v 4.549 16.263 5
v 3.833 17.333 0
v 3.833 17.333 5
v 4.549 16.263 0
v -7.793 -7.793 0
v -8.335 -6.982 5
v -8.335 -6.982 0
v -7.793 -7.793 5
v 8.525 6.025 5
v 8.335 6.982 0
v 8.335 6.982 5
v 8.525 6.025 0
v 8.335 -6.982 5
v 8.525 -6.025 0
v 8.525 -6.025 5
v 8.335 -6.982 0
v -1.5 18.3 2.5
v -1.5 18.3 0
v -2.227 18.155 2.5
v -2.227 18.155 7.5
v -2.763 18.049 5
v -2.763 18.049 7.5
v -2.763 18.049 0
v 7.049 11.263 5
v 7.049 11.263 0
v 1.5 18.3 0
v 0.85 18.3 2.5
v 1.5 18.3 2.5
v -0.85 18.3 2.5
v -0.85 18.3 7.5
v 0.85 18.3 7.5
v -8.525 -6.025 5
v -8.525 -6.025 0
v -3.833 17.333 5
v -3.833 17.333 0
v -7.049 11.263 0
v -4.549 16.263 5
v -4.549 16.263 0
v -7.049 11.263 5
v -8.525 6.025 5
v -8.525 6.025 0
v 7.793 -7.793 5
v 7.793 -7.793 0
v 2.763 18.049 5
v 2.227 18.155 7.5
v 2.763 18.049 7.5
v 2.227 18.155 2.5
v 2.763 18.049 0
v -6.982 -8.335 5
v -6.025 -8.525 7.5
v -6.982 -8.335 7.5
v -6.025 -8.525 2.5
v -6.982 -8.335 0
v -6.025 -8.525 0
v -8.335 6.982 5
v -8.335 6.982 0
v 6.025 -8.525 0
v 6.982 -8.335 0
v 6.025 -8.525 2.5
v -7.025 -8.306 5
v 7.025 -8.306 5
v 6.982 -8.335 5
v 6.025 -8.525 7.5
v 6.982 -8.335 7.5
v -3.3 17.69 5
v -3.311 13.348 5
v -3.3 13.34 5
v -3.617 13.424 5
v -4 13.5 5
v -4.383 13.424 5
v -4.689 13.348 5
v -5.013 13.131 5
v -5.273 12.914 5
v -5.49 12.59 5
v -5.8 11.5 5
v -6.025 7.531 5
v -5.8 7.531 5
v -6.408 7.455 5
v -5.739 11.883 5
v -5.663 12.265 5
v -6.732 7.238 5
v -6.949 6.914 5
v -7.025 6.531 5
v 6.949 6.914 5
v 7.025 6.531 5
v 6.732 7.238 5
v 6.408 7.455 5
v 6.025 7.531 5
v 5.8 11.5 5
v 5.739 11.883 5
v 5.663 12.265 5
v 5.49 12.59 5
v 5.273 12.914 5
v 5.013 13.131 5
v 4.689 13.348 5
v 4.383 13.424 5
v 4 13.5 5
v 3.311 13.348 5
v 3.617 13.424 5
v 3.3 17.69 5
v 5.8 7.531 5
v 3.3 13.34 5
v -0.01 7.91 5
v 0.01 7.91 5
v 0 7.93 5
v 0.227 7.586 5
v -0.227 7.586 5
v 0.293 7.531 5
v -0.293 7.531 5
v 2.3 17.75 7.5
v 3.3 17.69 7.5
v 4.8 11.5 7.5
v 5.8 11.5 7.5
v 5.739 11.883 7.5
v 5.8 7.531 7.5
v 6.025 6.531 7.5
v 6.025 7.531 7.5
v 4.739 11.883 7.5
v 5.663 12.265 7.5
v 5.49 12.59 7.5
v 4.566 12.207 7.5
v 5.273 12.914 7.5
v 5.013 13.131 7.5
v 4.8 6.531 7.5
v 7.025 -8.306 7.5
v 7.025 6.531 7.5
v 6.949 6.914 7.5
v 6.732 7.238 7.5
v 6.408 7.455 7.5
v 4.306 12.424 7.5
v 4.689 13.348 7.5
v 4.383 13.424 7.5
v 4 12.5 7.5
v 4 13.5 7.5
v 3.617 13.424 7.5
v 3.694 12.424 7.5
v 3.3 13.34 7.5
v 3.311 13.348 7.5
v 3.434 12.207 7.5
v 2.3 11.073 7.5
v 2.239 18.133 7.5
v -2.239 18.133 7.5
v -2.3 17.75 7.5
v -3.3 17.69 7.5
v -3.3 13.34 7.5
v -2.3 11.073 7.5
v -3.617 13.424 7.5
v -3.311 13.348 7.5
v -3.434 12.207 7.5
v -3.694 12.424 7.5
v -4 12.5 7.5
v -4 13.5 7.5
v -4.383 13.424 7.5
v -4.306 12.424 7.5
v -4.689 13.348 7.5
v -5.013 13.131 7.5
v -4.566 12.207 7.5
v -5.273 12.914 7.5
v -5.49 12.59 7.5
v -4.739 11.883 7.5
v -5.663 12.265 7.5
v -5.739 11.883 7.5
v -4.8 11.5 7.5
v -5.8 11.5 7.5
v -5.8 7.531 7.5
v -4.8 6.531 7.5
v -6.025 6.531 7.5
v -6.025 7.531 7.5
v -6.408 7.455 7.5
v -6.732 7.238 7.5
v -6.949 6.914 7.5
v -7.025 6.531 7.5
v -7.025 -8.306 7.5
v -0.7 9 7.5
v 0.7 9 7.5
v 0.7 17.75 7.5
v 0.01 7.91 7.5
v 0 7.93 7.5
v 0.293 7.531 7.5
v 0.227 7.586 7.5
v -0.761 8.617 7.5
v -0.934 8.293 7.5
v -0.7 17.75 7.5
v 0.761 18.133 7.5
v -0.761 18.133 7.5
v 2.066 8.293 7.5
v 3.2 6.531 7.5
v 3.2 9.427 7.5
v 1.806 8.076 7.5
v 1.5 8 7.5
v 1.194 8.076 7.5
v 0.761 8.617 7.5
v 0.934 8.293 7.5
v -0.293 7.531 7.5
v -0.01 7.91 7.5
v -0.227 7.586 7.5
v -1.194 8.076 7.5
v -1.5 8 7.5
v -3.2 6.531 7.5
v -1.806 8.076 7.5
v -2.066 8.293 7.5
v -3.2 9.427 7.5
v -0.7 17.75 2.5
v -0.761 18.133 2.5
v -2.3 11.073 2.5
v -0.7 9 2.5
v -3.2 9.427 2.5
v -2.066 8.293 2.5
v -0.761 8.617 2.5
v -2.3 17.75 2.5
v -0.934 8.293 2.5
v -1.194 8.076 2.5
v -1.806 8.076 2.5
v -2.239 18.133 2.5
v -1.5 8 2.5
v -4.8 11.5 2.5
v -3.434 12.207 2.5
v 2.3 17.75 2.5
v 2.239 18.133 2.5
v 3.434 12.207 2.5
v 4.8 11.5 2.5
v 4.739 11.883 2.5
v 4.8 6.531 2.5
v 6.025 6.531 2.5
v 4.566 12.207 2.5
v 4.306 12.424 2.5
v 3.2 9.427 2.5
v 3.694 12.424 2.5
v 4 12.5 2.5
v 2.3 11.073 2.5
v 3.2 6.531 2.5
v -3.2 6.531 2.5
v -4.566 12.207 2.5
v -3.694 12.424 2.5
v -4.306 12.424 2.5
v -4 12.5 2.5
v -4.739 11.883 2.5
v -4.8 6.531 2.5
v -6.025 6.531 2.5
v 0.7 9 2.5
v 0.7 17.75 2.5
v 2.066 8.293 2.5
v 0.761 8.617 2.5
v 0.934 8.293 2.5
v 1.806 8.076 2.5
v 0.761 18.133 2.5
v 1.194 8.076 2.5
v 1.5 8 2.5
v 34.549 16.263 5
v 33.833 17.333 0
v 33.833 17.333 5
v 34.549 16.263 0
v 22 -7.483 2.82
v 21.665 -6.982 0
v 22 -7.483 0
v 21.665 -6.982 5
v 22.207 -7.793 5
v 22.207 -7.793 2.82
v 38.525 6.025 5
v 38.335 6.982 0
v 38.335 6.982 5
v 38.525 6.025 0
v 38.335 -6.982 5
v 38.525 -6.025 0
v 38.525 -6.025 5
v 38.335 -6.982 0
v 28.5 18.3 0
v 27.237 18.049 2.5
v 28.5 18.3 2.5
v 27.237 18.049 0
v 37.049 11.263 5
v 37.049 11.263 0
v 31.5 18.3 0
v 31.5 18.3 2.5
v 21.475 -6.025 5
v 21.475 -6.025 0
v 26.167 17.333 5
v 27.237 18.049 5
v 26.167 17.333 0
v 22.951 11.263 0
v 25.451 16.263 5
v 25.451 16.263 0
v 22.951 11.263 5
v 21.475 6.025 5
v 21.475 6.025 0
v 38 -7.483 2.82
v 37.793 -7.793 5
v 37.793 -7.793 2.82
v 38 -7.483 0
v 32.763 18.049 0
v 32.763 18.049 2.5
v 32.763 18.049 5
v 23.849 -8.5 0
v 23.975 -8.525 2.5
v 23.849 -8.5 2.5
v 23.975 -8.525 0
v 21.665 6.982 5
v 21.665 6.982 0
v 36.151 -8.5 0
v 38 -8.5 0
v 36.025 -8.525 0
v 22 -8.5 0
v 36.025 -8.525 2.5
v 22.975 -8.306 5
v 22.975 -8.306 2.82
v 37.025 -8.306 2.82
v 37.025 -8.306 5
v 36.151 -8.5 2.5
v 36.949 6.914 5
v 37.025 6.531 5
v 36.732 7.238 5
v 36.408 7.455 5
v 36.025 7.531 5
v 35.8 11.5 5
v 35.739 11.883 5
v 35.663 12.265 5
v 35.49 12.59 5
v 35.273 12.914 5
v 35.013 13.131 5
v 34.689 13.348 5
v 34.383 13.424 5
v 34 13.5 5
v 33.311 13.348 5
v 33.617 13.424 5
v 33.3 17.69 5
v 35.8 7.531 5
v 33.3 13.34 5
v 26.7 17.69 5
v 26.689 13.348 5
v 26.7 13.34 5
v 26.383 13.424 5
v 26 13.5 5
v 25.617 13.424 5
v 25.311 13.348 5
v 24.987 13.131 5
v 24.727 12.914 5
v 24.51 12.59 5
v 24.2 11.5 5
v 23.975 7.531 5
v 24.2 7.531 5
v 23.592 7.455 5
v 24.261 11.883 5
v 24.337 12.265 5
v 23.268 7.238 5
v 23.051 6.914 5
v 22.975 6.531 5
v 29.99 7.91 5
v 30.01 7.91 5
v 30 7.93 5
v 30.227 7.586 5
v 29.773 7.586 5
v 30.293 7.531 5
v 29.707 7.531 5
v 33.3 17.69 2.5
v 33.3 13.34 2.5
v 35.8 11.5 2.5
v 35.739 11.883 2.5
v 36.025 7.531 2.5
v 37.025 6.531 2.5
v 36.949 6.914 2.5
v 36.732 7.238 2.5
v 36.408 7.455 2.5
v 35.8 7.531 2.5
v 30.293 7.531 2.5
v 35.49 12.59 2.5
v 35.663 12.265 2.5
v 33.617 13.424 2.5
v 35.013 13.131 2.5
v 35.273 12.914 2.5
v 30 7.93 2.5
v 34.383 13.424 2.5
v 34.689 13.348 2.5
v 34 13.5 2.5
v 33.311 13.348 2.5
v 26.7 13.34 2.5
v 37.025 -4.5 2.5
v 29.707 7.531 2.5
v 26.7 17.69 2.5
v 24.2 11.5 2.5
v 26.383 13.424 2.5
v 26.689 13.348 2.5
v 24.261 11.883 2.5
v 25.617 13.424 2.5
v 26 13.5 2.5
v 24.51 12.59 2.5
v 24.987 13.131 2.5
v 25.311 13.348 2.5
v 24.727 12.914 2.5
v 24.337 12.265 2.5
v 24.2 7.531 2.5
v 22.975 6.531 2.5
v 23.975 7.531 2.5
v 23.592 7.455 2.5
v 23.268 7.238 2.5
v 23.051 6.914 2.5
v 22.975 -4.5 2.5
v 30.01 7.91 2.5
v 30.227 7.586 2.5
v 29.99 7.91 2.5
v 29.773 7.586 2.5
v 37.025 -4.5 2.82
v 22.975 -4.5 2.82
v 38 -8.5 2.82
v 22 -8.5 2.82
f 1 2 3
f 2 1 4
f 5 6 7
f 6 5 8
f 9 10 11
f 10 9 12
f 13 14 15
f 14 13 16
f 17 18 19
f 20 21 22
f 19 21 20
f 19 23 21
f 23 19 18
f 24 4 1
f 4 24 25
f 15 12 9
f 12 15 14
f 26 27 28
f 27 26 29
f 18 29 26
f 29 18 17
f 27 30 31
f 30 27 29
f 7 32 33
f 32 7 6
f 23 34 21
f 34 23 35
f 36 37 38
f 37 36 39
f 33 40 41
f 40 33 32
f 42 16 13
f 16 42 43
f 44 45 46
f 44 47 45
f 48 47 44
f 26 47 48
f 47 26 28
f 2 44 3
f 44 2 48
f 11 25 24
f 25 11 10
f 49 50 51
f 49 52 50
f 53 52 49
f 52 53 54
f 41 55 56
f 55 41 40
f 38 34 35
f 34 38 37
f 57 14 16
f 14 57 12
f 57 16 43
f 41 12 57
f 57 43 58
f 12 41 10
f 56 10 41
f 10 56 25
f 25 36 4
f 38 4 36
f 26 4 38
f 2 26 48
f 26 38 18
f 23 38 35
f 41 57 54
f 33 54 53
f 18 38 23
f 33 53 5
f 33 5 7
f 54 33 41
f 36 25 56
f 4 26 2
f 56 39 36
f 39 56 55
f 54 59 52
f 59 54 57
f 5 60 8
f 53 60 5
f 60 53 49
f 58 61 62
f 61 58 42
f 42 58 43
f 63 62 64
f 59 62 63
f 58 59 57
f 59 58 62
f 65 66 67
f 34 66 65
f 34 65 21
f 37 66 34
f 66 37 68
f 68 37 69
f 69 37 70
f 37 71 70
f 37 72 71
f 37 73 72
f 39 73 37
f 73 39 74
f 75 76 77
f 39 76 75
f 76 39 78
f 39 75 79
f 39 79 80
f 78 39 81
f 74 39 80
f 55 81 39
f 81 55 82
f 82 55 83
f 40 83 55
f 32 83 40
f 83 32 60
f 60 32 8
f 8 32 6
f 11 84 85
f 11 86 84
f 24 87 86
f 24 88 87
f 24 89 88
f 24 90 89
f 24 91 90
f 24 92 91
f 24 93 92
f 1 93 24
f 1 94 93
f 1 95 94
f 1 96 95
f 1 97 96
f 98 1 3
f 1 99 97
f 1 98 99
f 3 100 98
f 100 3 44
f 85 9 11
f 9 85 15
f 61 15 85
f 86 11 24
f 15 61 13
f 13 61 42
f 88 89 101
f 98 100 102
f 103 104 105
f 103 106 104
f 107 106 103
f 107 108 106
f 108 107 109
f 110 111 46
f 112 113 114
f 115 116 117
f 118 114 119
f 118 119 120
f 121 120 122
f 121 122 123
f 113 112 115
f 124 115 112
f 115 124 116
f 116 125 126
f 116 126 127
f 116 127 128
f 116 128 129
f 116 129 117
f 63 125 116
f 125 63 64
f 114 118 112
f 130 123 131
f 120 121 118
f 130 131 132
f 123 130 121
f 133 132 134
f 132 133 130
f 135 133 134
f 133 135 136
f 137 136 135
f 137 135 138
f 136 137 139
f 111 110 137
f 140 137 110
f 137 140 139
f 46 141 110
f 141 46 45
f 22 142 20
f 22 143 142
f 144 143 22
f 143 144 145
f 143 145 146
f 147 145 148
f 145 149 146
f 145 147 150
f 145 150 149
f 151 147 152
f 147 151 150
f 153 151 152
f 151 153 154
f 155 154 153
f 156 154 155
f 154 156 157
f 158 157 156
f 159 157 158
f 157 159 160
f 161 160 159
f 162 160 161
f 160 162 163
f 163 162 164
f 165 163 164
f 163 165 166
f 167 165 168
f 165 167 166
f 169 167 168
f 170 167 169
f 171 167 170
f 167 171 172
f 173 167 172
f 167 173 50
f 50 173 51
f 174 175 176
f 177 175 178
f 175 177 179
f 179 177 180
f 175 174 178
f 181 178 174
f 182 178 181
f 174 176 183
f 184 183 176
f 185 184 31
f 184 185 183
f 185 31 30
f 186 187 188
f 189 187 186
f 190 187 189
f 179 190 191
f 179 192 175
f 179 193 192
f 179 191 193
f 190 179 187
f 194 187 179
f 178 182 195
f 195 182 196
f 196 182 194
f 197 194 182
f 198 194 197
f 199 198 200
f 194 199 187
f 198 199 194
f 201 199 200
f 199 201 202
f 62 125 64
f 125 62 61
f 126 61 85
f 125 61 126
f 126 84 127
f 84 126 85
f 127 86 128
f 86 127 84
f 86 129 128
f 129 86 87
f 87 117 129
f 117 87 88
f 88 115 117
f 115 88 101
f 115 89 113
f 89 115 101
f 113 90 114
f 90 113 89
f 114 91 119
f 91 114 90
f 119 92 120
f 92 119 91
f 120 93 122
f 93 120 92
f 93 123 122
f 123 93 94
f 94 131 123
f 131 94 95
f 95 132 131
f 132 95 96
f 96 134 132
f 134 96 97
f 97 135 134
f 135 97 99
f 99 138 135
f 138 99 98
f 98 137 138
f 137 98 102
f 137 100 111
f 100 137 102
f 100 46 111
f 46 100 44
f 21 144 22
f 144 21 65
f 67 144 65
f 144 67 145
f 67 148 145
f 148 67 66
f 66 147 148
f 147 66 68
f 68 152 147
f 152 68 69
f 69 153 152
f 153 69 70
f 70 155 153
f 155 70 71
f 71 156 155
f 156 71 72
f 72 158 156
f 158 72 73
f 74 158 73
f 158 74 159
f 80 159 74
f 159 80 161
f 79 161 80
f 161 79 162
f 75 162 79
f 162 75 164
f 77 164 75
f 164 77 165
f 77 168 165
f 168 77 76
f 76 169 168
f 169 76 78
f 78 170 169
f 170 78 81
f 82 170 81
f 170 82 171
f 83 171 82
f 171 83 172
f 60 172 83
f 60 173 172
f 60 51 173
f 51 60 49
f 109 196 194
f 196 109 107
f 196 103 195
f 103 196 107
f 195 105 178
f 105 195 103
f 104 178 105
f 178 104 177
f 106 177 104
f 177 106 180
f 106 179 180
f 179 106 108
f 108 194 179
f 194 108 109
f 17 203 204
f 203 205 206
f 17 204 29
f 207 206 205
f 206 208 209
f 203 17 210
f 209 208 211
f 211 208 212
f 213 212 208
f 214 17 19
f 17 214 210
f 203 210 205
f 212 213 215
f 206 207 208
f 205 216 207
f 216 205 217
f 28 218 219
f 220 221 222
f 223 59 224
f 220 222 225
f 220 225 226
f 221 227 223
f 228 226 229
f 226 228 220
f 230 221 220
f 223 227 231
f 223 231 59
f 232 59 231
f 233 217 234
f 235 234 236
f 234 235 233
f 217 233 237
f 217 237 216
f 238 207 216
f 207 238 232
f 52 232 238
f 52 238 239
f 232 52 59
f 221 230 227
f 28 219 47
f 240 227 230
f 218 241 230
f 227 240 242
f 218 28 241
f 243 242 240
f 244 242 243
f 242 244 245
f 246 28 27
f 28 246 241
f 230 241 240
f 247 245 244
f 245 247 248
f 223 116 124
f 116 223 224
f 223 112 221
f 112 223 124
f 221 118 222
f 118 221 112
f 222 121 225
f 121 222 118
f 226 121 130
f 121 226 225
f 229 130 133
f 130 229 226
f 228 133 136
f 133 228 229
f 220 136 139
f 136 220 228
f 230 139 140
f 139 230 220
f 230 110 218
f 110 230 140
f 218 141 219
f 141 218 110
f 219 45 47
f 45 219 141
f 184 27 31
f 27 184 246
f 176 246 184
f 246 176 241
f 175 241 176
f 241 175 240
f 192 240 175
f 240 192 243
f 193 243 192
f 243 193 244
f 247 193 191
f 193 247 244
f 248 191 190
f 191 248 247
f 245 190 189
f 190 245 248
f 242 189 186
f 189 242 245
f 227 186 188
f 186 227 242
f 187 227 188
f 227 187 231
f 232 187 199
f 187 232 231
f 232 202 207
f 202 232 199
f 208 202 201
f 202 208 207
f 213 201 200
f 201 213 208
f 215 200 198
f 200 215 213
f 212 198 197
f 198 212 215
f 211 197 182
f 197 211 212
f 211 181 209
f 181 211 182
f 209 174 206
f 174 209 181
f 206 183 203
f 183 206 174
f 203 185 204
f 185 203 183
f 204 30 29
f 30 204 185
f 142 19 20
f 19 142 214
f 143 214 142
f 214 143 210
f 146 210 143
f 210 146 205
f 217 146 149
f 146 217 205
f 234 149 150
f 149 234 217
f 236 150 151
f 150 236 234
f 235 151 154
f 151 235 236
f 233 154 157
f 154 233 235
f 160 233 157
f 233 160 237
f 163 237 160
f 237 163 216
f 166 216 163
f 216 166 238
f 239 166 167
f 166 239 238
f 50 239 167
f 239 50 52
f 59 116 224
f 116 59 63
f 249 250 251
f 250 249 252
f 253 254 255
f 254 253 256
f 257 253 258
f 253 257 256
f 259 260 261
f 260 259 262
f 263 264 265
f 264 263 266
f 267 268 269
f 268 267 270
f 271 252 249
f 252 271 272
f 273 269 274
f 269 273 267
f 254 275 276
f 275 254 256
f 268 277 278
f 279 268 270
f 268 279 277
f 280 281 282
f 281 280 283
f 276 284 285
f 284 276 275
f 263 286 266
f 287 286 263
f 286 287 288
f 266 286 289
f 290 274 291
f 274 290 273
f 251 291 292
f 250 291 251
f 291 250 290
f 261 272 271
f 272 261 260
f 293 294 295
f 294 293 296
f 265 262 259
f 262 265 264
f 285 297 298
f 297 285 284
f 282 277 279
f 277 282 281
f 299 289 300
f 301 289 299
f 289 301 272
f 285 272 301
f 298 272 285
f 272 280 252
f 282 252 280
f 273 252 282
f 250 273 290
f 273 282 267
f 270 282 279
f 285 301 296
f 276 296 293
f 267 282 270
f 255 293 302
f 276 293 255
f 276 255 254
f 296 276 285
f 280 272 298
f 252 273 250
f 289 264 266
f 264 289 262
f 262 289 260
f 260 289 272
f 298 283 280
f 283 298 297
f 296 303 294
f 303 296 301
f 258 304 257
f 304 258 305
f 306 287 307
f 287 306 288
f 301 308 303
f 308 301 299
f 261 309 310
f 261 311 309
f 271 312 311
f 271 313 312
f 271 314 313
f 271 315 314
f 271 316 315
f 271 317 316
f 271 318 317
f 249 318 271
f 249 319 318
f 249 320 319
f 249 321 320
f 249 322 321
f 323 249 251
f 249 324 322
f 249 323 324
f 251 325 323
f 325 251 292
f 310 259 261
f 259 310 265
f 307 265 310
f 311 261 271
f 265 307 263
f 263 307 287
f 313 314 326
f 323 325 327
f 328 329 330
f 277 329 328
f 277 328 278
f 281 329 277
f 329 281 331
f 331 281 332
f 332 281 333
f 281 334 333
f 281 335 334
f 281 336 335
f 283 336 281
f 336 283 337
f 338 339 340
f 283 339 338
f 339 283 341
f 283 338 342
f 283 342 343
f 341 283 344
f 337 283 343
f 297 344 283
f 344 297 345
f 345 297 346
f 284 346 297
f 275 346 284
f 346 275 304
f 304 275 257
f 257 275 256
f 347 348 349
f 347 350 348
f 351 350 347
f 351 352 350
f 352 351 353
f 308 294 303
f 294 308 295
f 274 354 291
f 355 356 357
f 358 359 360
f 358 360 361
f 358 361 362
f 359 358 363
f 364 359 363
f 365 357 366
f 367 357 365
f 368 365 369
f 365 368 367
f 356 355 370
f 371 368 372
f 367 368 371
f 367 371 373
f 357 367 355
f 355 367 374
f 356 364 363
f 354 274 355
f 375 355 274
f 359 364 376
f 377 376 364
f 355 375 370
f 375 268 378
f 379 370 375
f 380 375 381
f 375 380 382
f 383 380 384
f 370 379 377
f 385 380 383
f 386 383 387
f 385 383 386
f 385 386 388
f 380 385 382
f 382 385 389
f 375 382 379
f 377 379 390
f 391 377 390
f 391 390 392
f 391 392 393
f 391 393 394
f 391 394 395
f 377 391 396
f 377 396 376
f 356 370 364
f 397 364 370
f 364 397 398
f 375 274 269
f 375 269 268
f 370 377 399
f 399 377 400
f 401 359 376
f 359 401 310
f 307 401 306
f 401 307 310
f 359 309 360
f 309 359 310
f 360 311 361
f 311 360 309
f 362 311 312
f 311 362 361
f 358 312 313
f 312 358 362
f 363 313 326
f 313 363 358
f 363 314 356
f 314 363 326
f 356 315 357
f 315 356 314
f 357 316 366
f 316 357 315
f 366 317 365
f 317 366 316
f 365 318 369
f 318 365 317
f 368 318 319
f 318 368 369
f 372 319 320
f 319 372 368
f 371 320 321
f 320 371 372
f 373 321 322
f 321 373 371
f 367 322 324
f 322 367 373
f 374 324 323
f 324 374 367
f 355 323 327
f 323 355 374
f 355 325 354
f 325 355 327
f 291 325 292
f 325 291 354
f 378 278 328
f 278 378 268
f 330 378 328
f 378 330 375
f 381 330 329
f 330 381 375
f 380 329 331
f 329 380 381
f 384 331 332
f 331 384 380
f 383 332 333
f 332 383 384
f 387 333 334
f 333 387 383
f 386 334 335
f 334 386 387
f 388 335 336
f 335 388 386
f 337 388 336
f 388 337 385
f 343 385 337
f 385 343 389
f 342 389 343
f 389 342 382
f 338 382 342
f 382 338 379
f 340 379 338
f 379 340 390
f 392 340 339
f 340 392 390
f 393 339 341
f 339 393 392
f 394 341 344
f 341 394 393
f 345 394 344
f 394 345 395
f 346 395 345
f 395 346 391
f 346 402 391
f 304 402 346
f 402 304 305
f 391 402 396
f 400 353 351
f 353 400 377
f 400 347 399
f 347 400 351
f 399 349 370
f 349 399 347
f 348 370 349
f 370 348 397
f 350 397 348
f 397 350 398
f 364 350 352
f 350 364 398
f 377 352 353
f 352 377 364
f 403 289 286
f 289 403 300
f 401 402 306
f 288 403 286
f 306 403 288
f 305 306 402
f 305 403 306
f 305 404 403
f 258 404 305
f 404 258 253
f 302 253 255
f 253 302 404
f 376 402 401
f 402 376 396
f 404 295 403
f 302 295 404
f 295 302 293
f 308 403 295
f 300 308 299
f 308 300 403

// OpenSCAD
module A_Channel(p1,p2){
  hull() {
    translate(p1)
      circle(r=1.6/2,$fn=16);
    
    translate(p2)
      circle(r=1.6/2,$fn=16);
  }
}

module B_WireChannel() {
  union(){
    A_Channel(
      [-4,6],
      [-4,10]
    );
    
    A_Channel(
      [-4,10],
      [-1.5,8]
    );
    
    A_Channel(
      [-1.5,8],
      [-1.5,15]
    );
  }
}

module C_Hollow(){
  PLUG_SIZE=[1,1]*12.05;
  TO_ORIGIN = PLUG_SIZE*-.5;
  
  union() {
    translate(TO_ORIGIN)
      square(PLUG_SIZE);

    B_WireChannel();
    mirror([1,0,0])
      B_WireChannel();    
  }
}

// Ensure front and rear are open for USB-A and wires out, resp.
module D_HollowThrough() {
  translate([0,-1])
  scale([1,1.25,1])
    C_Hollow();
}


module E_FullBottom() {
  minkowski($fn=16){
    hull() C_Hollow();
    circle(2.5);
  }
}

// Leveled part
module F_HollowThroughShell() {
  intersection(){
    E_FullBottom();
    
    minkowski($fn=16) {
      D_HollowThrough();
      circle(1);
    }
  }
}

module G_PlugBottom() {
  difference() {
    union() {
      linear_extrude(height=5) 
        E_FullBottom();
      
      translate([0,0,5])
      linear_extrude(height=2.5)
        F_HollowThroughShell();
    }

    translate([0,0,2.5])
    linear_extrude(height=6)    
      D_HollowThrough();
  }
}

module H_PlugTop() {
  union() {
    difference() {
      linear_extrude(height=5) 
        E_FullBottom();
      
      translate([0,0,2.5])
      linear_extrude(height=5)
        F_HollowThroughShell();
    }
    
    // Retaining wall for metal plug notch
    WALL_SIZE=[16,4,2.5+0.32];

    translate([0,-6.5,WALL_SIZE[2]/2])    
    translate(WALL_SIZE*-.5)
      cube(WALL_SIZE);
  }
}

G_PlugBottom();

translate([30,0,0])
  H_PlugTop();
